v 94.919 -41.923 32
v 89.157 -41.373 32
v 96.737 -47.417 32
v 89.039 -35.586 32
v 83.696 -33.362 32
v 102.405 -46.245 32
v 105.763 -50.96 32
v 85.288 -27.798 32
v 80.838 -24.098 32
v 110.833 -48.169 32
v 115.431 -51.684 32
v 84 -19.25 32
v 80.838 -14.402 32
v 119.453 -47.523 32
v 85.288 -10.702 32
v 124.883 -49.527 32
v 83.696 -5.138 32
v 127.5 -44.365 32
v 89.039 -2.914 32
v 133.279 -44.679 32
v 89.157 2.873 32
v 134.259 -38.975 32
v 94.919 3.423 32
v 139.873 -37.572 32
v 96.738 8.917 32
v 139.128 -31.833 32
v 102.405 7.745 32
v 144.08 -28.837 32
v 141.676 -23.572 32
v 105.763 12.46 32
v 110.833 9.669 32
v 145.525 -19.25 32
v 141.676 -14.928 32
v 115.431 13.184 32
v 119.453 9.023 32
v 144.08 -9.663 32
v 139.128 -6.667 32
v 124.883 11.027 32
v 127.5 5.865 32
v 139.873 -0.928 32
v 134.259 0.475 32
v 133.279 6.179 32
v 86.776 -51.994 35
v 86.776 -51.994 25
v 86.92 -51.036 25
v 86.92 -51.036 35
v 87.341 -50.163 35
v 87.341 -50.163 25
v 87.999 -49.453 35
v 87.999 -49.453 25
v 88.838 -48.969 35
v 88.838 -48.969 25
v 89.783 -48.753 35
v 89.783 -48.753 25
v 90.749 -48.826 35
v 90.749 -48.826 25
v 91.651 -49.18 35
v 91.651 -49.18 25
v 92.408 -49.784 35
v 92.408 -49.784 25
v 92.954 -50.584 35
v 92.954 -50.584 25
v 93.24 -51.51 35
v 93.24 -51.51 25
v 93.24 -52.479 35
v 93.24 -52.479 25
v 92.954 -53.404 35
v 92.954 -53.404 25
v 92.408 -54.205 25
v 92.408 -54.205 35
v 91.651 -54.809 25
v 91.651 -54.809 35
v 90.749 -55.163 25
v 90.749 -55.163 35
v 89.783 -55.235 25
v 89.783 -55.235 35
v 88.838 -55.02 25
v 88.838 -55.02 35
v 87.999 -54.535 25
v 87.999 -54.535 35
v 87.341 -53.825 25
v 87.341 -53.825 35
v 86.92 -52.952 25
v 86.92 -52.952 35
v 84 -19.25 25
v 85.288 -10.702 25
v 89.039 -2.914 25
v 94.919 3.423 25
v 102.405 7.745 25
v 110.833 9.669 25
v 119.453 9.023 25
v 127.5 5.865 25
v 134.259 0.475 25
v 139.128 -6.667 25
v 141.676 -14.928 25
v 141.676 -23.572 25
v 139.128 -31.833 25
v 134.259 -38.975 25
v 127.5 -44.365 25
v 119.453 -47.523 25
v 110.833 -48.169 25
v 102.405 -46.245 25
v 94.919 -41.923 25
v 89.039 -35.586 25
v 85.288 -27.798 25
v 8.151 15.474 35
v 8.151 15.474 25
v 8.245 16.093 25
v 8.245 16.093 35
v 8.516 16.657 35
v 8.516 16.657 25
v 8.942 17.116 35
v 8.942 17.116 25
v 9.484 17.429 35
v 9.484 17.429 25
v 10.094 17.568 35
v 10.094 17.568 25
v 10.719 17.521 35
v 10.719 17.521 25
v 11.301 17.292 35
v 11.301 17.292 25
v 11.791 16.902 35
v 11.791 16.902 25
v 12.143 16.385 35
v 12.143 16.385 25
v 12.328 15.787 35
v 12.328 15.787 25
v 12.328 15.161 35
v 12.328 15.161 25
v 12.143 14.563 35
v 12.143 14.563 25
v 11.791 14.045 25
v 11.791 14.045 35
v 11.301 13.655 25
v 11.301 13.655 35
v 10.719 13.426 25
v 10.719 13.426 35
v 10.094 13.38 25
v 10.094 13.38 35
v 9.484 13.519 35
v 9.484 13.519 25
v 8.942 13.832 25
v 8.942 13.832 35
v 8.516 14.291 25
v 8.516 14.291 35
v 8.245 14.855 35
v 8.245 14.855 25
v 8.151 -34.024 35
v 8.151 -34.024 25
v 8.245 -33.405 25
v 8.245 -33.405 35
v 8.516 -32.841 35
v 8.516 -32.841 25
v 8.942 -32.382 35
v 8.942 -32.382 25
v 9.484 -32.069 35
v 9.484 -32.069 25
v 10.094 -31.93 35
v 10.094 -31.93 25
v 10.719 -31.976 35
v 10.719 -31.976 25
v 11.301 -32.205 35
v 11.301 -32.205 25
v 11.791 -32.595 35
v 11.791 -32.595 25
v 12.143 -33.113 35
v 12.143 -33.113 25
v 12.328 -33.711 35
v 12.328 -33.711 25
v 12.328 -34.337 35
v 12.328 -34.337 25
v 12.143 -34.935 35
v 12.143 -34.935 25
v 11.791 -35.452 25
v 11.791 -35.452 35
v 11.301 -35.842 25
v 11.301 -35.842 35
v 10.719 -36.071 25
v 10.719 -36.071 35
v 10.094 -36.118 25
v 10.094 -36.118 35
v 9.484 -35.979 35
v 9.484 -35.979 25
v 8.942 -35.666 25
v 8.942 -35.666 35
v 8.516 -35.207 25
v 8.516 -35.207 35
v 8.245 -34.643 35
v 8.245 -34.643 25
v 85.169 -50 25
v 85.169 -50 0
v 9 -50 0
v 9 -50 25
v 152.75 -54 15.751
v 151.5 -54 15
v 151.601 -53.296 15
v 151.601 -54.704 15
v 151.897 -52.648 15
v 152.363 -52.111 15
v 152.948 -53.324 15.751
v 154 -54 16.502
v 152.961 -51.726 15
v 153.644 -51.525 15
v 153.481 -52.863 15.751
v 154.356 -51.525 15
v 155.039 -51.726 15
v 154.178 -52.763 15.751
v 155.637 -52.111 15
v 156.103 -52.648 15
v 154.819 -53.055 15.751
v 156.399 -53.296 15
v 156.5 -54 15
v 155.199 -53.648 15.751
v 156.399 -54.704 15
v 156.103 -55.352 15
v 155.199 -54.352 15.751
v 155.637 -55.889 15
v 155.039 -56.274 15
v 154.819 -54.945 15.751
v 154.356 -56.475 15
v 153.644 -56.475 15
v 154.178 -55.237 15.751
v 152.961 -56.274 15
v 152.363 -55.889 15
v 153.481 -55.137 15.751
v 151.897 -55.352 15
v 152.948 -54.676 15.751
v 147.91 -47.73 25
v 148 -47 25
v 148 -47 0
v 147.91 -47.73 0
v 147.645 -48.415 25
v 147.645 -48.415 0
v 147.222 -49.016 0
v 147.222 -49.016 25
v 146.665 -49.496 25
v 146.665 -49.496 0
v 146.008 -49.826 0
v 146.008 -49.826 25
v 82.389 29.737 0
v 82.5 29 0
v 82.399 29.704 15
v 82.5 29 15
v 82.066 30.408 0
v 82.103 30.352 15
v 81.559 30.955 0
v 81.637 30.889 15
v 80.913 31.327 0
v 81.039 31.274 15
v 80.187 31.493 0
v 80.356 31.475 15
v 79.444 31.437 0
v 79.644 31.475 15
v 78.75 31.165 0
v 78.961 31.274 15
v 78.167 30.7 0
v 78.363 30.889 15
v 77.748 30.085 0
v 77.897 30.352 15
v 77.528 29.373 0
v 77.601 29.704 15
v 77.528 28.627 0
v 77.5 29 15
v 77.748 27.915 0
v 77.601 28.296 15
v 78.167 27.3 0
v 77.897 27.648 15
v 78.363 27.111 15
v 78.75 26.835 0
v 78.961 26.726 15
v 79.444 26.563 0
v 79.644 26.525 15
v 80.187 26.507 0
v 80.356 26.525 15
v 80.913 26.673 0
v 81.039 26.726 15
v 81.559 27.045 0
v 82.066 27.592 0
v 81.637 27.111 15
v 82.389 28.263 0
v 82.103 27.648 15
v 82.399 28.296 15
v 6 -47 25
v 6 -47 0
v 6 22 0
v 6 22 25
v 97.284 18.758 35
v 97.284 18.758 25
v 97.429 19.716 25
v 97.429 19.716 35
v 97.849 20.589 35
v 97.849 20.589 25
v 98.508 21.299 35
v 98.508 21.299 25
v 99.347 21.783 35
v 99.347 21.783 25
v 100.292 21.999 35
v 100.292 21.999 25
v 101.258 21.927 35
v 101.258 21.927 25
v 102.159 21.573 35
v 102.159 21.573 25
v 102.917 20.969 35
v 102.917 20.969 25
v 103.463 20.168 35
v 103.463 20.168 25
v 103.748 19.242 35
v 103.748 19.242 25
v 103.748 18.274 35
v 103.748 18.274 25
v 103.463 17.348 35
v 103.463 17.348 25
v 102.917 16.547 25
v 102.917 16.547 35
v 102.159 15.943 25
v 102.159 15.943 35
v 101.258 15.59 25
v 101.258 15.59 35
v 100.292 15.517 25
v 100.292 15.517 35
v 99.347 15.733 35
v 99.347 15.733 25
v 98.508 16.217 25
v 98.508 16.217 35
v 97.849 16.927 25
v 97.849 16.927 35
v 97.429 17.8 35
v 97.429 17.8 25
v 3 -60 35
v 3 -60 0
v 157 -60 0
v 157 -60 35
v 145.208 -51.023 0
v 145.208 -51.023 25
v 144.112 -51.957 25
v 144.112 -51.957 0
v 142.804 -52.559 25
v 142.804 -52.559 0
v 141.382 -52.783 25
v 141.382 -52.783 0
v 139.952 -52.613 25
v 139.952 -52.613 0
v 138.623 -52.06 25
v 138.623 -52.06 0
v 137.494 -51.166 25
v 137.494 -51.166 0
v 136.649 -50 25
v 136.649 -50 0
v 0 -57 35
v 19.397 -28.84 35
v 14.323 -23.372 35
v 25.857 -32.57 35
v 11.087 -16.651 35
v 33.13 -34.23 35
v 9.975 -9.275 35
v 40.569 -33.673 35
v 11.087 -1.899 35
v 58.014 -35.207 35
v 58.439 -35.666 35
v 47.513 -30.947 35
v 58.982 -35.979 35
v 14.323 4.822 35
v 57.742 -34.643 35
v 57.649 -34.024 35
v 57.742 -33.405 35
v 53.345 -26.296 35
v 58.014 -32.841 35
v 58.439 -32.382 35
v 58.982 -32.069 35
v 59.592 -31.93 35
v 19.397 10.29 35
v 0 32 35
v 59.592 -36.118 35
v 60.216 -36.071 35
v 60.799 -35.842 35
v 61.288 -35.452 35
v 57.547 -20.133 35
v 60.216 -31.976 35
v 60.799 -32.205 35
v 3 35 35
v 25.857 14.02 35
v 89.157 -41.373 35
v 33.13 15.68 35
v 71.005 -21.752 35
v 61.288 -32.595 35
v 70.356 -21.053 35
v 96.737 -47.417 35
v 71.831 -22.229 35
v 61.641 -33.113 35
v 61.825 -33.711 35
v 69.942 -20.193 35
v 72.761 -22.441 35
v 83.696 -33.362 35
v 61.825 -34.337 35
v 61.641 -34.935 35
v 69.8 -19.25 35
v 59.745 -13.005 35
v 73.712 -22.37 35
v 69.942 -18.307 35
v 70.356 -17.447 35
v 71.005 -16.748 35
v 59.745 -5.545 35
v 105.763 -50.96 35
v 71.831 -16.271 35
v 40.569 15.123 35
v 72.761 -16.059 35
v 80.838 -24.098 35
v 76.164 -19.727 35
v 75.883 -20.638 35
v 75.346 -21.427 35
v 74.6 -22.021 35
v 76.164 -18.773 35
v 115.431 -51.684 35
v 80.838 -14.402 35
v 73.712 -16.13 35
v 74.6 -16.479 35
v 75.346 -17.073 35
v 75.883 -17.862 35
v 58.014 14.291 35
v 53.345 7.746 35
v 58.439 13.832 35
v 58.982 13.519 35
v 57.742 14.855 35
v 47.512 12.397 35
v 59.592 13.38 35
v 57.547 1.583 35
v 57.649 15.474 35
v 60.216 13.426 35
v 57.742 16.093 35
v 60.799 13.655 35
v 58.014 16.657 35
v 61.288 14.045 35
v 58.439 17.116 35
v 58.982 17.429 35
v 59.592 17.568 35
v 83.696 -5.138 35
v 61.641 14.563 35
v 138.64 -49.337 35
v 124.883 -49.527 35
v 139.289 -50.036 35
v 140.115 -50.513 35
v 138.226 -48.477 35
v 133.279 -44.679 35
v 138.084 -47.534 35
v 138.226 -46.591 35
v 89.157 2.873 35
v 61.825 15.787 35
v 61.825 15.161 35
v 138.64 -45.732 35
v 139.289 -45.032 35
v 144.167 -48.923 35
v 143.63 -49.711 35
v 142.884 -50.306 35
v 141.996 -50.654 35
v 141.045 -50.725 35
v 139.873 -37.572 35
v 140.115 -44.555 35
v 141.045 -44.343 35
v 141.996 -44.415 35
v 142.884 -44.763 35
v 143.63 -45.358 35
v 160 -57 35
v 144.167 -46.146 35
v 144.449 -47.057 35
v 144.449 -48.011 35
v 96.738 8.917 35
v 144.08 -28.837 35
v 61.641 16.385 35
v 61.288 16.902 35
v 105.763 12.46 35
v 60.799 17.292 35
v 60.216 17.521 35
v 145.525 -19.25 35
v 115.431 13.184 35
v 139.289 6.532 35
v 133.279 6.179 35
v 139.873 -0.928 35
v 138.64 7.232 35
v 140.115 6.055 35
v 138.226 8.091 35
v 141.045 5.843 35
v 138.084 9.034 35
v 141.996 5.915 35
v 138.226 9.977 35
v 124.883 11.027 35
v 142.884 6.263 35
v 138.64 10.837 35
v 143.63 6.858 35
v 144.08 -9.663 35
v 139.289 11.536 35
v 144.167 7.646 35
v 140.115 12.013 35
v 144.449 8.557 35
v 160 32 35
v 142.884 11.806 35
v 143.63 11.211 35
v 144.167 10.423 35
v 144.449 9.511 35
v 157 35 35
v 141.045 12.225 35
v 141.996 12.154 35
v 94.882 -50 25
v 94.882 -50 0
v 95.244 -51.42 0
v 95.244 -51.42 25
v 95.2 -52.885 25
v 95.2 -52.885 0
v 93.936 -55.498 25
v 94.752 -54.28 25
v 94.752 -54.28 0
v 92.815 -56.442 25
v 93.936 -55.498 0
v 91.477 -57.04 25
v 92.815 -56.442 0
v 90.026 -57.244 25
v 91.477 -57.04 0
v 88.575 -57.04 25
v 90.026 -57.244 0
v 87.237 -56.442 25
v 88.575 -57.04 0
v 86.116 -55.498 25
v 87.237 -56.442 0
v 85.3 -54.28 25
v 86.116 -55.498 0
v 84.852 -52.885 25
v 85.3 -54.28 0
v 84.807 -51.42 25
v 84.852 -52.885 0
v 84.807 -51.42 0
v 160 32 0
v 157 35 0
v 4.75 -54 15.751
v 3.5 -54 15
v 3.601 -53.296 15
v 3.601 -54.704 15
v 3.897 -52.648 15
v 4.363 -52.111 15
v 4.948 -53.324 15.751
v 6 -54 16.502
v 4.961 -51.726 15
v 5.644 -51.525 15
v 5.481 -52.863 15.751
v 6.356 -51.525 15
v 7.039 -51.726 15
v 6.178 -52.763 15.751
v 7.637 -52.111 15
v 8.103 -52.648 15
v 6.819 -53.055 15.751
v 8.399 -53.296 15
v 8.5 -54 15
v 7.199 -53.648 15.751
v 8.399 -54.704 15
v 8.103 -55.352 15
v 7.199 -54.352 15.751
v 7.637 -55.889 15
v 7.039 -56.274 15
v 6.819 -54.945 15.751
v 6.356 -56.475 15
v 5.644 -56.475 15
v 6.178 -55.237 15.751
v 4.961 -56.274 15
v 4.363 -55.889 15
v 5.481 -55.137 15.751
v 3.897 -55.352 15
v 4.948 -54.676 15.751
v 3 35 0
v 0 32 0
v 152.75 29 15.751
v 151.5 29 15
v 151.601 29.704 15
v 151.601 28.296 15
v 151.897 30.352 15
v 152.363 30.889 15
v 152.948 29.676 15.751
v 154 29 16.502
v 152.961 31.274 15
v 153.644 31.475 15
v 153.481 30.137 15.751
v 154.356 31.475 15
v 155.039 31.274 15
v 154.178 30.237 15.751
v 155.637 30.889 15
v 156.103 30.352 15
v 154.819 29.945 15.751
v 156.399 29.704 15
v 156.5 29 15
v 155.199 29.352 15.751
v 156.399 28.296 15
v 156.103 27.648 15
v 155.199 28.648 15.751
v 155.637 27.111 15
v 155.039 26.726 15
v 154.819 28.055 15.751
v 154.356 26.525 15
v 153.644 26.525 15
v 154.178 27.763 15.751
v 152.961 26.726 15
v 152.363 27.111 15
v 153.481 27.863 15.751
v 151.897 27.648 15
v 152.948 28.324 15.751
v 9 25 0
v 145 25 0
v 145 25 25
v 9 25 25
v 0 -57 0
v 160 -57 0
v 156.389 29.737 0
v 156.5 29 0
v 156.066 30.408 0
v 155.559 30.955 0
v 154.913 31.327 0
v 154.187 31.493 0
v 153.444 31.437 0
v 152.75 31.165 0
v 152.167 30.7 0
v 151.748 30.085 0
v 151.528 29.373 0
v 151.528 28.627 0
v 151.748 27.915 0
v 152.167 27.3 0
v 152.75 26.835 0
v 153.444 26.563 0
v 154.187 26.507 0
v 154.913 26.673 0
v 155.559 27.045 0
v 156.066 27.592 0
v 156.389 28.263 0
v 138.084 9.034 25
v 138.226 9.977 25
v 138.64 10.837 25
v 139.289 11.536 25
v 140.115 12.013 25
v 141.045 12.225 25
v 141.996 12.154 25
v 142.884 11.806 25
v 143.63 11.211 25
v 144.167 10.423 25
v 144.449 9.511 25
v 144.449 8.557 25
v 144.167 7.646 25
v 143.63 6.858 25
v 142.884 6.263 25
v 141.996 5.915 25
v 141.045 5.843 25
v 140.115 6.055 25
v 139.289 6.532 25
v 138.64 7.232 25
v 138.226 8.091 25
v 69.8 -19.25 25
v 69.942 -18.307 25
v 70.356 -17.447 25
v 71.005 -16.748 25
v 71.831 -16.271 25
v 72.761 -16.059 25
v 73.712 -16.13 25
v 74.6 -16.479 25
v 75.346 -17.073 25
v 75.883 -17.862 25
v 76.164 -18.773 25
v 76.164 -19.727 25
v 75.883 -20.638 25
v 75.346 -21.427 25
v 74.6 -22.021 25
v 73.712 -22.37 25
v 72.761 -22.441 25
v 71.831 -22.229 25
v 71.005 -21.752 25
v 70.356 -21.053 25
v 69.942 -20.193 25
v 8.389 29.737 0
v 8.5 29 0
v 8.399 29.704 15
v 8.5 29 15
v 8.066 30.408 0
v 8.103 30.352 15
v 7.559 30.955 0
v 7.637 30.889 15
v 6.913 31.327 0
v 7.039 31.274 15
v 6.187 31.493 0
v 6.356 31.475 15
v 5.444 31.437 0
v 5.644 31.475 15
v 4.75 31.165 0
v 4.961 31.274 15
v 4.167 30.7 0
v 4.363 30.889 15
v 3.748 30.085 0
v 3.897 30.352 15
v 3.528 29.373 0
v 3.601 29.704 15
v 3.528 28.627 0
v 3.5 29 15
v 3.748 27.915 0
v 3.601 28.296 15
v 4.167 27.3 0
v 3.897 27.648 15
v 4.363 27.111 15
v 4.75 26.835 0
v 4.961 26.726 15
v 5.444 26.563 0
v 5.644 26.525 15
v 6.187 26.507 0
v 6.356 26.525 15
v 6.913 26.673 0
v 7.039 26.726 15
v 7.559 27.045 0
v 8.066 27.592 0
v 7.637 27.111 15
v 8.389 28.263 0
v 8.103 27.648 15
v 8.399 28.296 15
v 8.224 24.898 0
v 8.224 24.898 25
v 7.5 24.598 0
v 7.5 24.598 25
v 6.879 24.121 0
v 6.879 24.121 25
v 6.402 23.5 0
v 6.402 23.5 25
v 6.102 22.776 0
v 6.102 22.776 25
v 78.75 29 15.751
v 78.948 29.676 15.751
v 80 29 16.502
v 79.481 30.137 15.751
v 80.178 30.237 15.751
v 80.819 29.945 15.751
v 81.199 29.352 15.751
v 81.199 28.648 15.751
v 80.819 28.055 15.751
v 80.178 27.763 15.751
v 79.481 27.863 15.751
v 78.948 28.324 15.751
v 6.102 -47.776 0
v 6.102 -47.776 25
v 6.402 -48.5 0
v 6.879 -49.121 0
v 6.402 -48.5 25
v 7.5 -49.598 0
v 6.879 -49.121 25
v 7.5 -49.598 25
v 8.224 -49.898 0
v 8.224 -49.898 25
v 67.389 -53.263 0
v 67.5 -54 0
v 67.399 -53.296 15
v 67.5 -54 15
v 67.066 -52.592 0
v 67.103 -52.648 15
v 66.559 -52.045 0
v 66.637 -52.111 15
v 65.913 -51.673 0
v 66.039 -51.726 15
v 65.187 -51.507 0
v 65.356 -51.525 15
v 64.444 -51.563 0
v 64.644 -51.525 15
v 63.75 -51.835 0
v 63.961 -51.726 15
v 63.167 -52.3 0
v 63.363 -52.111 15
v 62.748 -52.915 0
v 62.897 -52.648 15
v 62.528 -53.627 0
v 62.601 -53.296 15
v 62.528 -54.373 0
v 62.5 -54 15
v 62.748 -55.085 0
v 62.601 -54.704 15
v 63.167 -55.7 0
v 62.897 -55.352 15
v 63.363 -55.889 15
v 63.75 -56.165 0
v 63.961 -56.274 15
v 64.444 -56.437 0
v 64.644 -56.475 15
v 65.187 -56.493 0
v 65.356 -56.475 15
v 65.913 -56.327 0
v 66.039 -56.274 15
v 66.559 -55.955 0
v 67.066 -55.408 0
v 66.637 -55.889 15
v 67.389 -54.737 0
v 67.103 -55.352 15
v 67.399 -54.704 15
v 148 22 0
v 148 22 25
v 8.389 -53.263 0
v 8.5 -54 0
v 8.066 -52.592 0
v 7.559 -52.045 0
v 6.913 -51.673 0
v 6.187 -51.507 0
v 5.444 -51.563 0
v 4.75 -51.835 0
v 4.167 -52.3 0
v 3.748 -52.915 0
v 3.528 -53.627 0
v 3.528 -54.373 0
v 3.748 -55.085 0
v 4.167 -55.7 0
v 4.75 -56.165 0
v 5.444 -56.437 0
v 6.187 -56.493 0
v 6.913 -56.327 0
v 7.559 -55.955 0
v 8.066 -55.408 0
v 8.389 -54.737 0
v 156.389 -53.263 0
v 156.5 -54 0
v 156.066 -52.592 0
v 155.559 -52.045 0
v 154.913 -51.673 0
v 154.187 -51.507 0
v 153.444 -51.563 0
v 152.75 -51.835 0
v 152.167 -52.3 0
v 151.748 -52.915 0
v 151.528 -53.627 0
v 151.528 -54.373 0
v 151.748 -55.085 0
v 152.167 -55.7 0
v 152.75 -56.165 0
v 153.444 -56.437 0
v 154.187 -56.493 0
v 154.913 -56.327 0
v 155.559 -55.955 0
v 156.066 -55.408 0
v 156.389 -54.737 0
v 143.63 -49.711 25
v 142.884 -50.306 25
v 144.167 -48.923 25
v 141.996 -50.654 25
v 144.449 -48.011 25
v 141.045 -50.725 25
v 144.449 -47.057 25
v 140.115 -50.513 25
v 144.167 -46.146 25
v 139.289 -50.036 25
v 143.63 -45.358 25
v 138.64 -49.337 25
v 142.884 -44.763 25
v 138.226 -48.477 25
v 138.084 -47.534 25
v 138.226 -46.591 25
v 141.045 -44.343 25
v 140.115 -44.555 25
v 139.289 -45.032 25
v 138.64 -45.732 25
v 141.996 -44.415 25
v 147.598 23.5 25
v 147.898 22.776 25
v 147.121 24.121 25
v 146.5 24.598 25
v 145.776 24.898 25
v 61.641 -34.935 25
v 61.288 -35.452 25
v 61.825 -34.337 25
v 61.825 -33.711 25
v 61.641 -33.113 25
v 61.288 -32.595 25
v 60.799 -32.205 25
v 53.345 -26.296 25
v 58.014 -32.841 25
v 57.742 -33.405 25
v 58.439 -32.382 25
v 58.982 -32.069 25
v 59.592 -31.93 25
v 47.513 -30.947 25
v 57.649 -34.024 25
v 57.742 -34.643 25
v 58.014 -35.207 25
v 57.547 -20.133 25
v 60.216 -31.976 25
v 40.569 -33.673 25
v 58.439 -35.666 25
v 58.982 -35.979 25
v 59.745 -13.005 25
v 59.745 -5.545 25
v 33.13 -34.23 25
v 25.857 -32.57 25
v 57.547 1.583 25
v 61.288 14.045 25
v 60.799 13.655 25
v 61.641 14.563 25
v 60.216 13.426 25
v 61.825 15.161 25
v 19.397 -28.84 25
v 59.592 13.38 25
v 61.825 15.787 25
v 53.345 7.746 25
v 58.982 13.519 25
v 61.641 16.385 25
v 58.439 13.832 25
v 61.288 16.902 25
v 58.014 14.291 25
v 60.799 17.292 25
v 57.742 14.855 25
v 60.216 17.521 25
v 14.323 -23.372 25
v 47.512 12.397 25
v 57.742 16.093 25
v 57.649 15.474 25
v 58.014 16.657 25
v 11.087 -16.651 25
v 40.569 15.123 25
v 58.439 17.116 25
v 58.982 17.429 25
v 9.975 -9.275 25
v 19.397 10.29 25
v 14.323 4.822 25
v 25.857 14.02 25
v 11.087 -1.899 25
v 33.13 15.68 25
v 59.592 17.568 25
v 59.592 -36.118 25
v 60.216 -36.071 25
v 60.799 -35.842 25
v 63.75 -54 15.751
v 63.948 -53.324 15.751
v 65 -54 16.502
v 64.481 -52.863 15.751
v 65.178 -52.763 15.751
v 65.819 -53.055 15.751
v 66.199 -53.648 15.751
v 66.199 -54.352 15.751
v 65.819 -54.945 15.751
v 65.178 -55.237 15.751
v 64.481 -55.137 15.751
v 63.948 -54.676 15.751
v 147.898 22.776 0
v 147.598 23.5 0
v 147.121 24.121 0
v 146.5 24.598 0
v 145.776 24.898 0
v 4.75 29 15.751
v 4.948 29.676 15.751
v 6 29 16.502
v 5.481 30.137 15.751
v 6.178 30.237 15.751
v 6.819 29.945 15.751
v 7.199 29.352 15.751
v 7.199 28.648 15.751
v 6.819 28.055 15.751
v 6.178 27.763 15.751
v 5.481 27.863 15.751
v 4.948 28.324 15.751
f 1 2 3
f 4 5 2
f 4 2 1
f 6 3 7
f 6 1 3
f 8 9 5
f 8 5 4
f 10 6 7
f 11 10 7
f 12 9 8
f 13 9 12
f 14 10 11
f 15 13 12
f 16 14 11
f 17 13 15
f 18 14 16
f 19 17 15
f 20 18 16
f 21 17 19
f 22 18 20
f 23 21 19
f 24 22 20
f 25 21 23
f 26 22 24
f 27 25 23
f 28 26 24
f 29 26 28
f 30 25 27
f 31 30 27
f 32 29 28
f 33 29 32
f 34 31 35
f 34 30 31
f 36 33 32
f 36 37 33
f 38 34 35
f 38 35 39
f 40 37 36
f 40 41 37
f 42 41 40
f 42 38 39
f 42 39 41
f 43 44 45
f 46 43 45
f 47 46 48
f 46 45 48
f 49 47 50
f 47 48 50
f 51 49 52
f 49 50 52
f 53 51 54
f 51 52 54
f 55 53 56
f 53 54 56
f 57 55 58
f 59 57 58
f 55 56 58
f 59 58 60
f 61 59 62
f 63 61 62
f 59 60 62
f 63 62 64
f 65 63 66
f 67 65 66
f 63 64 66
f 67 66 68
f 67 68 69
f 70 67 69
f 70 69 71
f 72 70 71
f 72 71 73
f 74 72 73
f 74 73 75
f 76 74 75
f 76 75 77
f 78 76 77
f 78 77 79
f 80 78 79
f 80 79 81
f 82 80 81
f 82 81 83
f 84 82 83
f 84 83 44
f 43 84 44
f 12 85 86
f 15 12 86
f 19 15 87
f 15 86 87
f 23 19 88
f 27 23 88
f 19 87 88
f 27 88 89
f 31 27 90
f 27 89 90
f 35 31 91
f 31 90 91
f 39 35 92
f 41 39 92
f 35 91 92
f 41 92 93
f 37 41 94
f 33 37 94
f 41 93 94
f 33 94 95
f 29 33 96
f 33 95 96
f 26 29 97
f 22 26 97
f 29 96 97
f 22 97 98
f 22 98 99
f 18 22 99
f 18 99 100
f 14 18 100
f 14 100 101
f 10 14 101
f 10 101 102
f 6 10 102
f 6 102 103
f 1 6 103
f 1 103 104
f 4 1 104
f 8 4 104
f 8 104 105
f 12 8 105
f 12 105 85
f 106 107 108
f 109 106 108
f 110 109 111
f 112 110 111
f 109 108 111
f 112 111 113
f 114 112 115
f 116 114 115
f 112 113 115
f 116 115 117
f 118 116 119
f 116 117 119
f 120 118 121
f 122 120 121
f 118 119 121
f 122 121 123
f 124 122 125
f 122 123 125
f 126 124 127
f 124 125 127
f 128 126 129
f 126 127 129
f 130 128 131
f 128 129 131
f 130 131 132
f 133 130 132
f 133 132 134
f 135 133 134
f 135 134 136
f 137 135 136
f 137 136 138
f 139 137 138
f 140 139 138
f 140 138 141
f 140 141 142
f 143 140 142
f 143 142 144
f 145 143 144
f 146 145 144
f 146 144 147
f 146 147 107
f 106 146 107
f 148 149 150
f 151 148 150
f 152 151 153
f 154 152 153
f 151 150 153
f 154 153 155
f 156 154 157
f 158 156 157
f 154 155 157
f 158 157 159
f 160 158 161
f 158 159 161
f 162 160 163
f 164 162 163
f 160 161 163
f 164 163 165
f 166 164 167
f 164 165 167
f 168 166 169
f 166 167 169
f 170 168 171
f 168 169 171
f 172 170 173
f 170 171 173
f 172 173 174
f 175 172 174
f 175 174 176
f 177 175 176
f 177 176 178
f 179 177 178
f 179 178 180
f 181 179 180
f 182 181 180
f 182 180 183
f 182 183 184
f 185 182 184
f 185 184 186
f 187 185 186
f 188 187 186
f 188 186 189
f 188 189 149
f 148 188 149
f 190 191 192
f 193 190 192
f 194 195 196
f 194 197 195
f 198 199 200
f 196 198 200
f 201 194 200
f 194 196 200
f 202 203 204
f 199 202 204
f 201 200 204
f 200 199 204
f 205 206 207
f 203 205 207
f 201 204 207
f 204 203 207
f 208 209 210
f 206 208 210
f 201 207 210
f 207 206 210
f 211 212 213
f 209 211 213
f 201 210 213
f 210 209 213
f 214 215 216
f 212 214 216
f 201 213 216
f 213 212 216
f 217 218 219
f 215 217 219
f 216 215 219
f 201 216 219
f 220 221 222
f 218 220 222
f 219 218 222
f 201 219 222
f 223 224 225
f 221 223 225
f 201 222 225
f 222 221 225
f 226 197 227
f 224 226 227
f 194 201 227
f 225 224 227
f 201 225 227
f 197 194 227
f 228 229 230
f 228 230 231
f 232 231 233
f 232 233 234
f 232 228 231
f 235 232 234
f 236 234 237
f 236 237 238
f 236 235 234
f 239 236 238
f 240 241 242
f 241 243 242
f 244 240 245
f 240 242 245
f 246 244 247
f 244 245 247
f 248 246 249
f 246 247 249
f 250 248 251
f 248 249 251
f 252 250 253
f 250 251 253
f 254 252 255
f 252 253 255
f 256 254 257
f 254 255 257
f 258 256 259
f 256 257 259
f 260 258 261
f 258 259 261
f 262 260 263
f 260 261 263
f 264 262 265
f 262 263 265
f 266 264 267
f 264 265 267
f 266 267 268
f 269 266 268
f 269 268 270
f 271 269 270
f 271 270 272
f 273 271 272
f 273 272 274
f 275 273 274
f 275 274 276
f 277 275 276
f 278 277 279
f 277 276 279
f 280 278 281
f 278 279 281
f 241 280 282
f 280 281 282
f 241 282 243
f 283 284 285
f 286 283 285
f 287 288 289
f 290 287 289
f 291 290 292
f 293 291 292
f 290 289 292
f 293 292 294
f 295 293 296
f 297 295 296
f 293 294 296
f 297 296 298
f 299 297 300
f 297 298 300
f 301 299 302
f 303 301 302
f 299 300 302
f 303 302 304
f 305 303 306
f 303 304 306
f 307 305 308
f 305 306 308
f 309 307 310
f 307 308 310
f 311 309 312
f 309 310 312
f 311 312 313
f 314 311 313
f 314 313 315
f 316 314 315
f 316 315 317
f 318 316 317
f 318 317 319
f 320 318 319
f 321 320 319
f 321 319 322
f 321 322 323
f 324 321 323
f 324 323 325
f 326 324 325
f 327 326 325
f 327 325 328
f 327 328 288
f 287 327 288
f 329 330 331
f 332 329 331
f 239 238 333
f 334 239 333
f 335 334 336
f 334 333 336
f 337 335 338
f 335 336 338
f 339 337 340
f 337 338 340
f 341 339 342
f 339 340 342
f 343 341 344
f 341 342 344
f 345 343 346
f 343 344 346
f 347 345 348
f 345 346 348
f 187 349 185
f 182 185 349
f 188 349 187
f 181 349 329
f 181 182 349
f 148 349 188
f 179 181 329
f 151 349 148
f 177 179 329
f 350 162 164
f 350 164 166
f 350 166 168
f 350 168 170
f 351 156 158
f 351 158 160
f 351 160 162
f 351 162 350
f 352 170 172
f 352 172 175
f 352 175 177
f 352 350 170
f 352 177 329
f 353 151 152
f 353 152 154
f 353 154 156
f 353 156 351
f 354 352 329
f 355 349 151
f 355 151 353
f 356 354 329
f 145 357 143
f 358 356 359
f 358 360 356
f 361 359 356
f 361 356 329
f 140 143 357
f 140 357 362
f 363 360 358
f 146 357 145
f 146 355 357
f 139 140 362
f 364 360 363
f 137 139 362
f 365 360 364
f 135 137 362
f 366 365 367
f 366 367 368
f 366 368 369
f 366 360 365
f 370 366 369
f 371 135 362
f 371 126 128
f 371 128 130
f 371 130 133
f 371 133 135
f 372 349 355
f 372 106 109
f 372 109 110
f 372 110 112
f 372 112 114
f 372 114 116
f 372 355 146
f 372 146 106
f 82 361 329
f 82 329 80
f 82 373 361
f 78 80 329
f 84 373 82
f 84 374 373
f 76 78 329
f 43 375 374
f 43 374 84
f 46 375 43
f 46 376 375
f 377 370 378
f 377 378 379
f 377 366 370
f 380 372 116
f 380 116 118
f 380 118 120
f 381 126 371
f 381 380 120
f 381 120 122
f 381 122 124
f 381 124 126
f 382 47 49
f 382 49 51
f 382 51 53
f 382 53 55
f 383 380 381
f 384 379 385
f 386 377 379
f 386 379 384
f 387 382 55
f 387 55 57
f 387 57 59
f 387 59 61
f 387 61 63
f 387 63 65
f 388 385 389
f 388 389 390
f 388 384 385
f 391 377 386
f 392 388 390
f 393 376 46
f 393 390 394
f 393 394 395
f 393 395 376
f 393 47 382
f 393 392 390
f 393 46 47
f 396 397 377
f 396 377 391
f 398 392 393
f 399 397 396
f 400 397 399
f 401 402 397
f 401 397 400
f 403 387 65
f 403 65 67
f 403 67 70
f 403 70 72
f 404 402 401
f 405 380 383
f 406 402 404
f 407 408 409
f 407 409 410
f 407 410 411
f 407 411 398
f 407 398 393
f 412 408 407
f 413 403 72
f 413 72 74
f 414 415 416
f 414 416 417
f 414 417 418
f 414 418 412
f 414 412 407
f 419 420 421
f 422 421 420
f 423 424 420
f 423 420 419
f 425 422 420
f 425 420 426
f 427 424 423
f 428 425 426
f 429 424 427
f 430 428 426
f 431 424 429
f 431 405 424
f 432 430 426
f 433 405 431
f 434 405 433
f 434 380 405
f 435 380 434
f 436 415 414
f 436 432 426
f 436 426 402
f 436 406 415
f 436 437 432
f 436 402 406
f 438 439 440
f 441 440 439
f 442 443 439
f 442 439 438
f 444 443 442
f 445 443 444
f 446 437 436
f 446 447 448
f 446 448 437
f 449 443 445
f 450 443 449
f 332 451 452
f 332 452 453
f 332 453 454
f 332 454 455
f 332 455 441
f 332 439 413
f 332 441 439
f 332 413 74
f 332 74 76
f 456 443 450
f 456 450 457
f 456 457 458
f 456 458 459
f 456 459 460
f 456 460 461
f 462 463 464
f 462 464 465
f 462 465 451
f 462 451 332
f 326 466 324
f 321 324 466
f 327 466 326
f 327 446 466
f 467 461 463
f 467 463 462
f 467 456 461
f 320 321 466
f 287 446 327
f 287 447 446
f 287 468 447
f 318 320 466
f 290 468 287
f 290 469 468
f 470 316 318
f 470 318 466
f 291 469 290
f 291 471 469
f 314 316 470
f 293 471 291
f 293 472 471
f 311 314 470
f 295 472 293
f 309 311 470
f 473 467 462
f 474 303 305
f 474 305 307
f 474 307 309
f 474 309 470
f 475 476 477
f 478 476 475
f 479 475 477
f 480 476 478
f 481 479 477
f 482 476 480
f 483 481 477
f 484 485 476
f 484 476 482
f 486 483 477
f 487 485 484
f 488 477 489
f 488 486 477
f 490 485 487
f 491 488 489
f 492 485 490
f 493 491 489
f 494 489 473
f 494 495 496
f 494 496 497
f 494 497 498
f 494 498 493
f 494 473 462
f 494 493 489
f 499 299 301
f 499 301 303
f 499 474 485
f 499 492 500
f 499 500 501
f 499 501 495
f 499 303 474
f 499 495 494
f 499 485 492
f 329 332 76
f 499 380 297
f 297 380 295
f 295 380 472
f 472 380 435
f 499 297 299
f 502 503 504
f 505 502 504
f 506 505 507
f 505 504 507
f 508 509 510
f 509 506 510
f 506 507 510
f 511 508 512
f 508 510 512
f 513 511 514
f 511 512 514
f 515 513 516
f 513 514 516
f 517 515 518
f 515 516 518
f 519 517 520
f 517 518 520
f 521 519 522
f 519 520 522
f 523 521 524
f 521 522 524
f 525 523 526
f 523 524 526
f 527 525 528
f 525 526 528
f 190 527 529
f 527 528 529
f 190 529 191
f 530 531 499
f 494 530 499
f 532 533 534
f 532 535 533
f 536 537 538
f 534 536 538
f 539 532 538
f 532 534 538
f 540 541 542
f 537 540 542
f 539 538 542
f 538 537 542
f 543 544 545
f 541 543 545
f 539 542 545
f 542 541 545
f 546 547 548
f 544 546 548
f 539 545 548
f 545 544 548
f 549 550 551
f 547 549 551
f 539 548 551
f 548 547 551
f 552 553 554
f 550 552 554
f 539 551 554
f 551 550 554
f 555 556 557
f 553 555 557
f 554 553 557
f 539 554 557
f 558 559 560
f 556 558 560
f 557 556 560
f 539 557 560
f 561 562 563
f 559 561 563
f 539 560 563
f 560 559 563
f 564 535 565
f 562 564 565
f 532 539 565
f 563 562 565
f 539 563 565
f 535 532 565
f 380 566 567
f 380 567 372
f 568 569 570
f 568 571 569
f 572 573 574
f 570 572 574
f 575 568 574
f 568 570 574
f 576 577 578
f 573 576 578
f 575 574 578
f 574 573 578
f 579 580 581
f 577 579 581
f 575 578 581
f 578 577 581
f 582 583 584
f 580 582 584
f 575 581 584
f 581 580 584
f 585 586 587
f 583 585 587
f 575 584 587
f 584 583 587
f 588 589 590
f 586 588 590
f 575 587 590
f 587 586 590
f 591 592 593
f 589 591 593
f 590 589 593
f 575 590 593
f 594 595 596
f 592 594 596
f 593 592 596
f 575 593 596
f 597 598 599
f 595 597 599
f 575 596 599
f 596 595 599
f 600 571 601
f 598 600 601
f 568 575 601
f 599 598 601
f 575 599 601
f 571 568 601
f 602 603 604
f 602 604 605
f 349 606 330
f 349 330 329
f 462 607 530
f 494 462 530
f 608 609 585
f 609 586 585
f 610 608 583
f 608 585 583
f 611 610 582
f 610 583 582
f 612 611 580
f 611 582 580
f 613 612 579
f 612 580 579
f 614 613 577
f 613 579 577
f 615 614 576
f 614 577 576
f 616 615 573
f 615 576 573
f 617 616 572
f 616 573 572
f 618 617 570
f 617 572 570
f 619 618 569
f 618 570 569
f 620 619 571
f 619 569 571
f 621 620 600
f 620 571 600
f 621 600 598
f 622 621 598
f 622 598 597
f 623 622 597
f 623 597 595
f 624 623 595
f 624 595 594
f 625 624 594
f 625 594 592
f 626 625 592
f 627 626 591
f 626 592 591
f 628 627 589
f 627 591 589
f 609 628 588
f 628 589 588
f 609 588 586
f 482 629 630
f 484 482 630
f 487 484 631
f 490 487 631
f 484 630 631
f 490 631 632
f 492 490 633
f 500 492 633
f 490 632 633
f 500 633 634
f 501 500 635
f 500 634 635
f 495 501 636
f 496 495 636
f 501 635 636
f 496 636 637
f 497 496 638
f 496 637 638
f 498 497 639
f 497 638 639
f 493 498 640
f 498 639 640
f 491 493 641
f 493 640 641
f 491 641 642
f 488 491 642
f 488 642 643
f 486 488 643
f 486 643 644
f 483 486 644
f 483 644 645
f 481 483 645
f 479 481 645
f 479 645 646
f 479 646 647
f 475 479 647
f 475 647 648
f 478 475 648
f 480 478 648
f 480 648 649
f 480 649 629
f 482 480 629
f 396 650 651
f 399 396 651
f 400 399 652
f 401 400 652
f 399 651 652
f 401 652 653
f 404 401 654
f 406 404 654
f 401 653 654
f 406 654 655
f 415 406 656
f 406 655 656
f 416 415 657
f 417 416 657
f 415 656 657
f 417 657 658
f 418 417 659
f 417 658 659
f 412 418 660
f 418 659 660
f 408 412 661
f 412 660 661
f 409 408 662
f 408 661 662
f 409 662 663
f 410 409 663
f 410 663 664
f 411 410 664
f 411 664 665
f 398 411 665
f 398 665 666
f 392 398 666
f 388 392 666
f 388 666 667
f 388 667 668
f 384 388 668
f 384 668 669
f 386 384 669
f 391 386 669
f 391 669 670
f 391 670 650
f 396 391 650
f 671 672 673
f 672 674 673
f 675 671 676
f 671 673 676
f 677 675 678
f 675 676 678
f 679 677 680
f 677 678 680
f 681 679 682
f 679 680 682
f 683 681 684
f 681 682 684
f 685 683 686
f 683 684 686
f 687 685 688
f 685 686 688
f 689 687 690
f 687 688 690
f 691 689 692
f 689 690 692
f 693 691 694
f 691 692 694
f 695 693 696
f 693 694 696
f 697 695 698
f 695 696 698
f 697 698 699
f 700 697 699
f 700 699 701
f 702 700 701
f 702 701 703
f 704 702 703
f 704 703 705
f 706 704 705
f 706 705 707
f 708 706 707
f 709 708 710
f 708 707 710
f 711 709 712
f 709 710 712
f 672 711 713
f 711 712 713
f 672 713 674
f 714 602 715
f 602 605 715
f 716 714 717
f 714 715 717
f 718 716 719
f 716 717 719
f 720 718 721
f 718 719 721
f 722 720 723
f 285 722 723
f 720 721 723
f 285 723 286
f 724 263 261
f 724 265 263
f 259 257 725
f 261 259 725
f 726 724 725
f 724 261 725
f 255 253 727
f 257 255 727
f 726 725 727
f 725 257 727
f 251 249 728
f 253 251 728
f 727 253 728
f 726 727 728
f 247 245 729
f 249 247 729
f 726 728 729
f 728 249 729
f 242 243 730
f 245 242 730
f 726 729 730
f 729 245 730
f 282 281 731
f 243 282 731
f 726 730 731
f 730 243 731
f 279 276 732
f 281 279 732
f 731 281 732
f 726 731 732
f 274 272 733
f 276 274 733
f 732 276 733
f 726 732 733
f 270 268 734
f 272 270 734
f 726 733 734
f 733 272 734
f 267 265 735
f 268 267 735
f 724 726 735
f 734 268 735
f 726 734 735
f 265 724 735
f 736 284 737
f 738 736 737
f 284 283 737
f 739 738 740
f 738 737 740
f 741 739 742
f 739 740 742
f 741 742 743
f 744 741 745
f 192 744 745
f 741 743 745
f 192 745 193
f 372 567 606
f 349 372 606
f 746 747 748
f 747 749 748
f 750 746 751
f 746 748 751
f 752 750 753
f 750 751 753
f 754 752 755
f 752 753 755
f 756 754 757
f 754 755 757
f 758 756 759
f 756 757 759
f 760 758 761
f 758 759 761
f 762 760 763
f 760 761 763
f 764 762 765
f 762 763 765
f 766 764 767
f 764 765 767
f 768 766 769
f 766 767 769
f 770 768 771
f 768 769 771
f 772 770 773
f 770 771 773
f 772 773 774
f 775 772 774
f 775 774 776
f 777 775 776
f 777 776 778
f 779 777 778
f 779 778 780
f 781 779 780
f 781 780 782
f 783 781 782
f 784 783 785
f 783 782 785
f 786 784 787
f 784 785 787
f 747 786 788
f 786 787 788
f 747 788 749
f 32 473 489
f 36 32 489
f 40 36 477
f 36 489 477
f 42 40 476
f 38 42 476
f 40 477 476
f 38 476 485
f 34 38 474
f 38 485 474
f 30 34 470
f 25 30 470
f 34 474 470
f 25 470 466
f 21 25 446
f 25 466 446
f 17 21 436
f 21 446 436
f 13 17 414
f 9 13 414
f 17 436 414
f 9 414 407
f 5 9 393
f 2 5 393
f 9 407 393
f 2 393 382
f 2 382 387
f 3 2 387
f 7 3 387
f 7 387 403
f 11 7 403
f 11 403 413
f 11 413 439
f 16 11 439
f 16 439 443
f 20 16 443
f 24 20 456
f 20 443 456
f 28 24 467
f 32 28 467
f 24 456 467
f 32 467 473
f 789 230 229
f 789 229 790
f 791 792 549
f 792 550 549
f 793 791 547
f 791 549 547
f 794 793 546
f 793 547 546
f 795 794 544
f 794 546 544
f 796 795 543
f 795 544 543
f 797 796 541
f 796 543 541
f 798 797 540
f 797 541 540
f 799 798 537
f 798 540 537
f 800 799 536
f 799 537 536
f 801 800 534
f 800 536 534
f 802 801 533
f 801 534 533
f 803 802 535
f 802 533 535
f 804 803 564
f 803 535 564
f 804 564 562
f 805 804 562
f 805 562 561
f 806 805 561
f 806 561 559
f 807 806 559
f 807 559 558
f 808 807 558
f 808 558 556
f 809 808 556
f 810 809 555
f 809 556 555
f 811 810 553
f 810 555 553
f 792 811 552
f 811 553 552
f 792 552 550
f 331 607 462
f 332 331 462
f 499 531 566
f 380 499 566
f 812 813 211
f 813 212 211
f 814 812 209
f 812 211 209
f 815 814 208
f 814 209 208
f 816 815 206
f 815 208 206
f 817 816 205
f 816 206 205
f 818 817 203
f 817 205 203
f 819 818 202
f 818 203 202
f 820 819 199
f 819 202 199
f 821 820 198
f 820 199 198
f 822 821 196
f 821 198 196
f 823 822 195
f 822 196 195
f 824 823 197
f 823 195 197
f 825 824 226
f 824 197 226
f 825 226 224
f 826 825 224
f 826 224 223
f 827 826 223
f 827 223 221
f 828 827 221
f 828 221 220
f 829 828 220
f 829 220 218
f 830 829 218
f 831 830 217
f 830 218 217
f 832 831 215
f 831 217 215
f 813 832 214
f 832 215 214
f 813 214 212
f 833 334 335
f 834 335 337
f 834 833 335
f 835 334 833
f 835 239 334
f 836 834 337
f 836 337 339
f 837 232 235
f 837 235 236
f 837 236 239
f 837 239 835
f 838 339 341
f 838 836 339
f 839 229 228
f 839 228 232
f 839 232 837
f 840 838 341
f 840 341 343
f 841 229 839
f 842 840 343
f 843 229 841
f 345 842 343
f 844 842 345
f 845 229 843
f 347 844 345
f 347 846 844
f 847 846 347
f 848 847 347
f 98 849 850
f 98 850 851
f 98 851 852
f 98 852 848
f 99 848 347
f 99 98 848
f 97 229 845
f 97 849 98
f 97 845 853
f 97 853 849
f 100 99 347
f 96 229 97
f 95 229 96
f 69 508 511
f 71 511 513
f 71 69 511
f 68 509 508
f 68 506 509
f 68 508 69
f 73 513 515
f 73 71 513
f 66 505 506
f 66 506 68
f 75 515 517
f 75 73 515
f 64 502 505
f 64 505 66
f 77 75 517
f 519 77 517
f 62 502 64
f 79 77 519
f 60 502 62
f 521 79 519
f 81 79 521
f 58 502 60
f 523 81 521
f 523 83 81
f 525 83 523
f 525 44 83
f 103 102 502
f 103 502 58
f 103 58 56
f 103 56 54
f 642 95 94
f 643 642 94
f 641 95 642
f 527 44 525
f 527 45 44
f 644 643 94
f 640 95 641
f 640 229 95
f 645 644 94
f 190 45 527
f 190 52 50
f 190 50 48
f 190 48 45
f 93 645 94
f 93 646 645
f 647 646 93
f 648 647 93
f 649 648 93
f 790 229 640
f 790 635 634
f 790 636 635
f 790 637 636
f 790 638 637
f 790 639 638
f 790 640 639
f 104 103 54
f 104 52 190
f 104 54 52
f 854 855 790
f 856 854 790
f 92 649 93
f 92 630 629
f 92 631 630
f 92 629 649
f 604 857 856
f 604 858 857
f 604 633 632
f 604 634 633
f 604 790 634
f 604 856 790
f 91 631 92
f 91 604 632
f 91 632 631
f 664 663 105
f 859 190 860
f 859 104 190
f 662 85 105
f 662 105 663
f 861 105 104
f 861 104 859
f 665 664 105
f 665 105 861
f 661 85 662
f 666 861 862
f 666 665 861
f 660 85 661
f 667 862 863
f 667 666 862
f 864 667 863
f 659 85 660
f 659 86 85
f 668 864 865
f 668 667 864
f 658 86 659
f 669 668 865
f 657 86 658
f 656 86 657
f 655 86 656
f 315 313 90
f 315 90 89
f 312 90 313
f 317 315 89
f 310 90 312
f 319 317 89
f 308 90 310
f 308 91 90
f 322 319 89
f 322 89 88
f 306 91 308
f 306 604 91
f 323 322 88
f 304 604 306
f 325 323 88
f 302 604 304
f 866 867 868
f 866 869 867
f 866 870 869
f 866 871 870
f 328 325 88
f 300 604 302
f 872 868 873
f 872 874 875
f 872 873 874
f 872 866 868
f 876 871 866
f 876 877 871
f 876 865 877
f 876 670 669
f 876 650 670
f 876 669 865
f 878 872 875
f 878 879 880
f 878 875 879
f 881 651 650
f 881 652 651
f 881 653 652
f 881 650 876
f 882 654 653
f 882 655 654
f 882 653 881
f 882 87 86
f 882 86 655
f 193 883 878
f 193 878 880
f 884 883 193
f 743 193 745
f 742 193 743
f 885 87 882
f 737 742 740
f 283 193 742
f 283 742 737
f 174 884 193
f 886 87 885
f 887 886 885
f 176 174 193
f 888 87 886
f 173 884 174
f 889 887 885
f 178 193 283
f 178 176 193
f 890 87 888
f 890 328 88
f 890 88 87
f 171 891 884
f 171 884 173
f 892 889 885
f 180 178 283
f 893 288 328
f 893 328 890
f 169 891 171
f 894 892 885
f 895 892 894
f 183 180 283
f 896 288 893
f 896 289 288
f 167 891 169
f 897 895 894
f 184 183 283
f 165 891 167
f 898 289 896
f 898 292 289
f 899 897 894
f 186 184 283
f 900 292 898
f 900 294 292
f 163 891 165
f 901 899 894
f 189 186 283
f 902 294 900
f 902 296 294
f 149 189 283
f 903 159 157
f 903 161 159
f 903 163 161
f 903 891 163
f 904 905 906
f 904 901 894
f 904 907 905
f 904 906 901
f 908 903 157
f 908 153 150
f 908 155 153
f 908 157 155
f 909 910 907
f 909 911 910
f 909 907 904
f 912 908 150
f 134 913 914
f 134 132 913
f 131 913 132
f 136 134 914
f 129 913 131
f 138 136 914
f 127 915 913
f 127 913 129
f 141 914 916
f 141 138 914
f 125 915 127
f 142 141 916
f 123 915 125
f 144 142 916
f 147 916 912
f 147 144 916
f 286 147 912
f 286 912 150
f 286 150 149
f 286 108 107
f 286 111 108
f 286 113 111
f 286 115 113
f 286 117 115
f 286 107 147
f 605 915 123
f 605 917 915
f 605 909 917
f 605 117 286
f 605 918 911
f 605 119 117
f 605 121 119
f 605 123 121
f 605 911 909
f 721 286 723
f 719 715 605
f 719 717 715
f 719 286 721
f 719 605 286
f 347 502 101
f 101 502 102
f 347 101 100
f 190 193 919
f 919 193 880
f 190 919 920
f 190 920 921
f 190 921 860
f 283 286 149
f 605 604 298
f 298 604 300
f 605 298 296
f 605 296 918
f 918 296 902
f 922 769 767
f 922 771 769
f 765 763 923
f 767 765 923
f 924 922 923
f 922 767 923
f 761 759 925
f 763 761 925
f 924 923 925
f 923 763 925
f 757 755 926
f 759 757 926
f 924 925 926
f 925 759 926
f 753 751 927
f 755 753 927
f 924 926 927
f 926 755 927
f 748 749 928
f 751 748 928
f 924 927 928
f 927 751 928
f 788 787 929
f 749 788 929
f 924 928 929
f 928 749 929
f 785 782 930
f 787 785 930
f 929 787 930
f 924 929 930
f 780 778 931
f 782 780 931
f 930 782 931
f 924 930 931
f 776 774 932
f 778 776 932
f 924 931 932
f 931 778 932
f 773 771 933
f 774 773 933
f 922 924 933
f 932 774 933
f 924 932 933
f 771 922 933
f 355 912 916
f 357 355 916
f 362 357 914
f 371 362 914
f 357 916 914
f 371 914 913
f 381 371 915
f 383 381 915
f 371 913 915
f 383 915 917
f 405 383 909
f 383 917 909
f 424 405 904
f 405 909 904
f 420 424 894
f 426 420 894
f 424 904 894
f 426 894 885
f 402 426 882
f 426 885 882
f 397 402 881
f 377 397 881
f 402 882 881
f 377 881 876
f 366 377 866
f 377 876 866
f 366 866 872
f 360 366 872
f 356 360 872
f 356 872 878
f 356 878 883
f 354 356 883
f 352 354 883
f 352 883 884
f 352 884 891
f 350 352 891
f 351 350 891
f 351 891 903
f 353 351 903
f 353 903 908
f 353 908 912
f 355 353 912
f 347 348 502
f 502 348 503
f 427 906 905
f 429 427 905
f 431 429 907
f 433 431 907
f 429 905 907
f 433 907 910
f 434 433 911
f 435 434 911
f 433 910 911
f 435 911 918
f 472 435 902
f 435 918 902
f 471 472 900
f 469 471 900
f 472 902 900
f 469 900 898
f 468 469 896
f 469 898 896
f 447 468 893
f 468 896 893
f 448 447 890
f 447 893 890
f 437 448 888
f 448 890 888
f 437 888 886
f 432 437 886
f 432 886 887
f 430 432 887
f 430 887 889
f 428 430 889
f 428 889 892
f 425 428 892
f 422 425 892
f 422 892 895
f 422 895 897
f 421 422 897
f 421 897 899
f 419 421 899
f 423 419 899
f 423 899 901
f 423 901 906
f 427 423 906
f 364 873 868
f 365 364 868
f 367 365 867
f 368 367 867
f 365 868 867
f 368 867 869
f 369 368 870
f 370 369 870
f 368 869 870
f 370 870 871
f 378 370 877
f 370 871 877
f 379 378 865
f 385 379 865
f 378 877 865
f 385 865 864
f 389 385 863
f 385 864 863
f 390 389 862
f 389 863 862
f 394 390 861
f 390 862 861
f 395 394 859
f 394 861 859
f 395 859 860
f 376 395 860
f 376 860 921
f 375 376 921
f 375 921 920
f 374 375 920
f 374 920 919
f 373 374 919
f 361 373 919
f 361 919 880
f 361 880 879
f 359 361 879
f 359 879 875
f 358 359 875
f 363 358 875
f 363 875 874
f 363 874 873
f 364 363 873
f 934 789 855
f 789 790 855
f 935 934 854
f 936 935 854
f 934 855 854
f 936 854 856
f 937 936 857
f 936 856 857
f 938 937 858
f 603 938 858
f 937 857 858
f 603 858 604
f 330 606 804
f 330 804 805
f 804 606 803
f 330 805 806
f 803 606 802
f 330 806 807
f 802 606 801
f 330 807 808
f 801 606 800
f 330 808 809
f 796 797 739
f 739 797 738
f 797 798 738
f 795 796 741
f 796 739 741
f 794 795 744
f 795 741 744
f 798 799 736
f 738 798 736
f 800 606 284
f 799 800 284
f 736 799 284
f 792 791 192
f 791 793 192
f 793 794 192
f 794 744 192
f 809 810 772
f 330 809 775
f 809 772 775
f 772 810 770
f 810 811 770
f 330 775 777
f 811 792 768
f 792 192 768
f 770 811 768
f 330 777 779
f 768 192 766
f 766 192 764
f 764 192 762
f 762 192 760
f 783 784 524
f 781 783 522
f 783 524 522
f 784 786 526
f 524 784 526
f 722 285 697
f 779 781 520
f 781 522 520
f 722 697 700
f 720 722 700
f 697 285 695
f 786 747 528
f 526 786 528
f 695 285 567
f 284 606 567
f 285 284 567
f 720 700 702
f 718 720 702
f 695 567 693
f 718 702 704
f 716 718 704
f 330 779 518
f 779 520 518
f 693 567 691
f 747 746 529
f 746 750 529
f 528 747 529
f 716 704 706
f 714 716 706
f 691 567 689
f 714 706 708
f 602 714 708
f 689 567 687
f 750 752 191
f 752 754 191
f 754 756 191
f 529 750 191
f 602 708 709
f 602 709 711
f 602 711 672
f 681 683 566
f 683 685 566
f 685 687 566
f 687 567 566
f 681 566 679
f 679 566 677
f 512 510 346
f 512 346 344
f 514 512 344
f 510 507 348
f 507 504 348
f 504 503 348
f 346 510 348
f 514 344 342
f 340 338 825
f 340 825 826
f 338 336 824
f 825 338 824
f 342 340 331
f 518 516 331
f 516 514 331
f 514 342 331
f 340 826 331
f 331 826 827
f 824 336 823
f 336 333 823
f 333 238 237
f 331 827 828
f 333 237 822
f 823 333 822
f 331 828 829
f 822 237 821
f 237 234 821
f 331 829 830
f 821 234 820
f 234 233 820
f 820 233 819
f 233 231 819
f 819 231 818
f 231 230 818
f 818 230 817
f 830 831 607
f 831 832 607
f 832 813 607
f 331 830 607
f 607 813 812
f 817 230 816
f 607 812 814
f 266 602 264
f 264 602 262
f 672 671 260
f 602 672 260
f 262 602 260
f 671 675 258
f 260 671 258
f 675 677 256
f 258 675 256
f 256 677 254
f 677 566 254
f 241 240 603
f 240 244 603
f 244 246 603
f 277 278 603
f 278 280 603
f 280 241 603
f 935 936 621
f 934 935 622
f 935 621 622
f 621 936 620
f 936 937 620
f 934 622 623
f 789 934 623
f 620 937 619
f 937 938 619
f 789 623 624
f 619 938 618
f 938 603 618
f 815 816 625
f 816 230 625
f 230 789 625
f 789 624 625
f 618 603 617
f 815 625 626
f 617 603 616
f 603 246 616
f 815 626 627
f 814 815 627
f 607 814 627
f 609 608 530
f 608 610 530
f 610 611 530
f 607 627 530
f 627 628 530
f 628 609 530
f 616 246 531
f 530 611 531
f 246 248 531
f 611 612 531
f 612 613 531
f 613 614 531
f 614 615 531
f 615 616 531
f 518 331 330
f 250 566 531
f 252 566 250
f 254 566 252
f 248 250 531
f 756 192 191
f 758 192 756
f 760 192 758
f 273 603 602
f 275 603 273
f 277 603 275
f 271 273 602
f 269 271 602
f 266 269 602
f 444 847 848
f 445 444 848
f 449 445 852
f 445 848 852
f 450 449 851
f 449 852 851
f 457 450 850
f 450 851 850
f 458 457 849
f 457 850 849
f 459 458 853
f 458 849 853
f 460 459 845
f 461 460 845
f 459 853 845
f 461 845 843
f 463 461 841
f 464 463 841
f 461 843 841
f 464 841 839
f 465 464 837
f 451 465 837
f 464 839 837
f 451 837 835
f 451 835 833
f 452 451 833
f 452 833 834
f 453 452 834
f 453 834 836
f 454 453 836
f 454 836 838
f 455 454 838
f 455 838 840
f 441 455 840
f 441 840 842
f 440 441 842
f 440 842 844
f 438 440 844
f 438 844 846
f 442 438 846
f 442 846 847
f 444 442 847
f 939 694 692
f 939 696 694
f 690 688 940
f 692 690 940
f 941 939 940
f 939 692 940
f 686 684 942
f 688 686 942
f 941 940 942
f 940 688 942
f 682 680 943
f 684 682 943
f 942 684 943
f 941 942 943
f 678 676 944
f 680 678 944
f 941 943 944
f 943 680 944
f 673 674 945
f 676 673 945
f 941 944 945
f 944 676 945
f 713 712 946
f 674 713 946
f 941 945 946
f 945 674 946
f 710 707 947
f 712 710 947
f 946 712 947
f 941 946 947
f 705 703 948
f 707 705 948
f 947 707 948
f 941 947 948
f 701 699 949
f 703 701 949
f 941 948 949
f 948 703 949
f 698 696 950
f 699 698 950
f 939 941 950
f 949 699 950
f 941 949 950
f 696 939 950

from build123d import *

# Parameters (mm, degrees)
EXTRUDE_1_DEPTH        = 35
SKETCH_4_W             = 142
SKETCH_4_H             = 75
CUT_EXTRUDE_2_DEPTH    = 25
SKETCH_5_R             = 29
CUT_EXTRUDE_3_DEPTH    = 11
CHAMFER_3_SIZE         = 3
FILLET_2_R             = 3
SKETCH_7_R             = 3.2
SKETCH_7_R_2           = 3.25
CUT_EXTRUDE_4_DEPTH    = 11
SKETCH_8_R             = 25.025
CUT_EXTRUDE_5_DEPTH    = 11
SKETCH_9_R             = 5.25
CUT_EXTRUDE_6_DEPTH    = 25
HOLE_WIZARD_M6_1_D     = 5
HOLE_WIZARD_M6_1_DEPTH = 15
HOLE_WIZARD_M6_1_TIP   = 1.502151548
HOLE_WIZARD_M5_1_D     = 4.2
SKETCH_17_R            = 32.525
CUT_EXTRUDE_7_DEPTH    = 3


with BuildPart() as part:
    # 草图1 → 凸台-拉伸1 (new body)
    with BuildSketch(Plane.XY):
        Polygon((0, 0), (0, -60), (160, -60), (160, 35), (68, 35), (0, 35), align=None)
    extrude(amount=EXTRUDE_1_DEPTH)

    # 草图4 → 切除-拉伸2 (cut)
    with BuildSketch(Plane(origin=(0, 0, 0), x_dir=(-1, 0, 0), z_dir=(0, 0, -1))):
        with Locations((-77, -12.5)):
            Rectangle(SKETCH_4_W, SKETCH_4_H)
    extrude(amount=-CUT_EXTRUDE_2_DEPTH, mode=Mode.SUBTRACT)

    # 草图5 → 切除-拉伸3 (cut, through all)
    with BuildSketch(Plane(origin=(0, 0, 25), x_dir=(-1, 0, 0), z_dir=(0, 0, -1))):
        with Locations((-113, -19.25)):
            Circle(SKETCH_5_R)
    extrude(amount=-CUT_EXTRUDE_3_DEPTH, mode=Mode.SUBTRACT)

    # 倒角3
    chamfer_3_edges = [part.edges().sort_by_distance(p)[0] for p in [
        (0, 35, 17.5),
        (160, 35, 17.5),
        (160, -60, 17.5),
        (0, -60, 17.5),
    ]]
    chamfer(chamfer_3_edges, length=CHAMFER_3_SIZE)

    # 圆角2
    fillet_2_edges = [part.edges().sort_by_distance(p)[0] for p in [
        (6, 25, 12.5),
        (6, -50, 12.5),
        (148, -50, 12.5),
        (148, 25, 12.5),
    ]]
    fillet(fillet_2_edges, radius=FILLET_2_R)

    # 草图7 → 切除-拉伸4 (cut, through all)
    with BuildSketch(Plane(origin=(0, 0, 25), x_dir=(-1, 0, 0), z_dir=(0, 0, -1))):
        with Locations((-73, -19.25)):
            Circle(SKETCH_7_R)
        with Locations((-141.284271247, -47.534271247)):
            Circle(SKETCH_7_R)
        with Locations((-141.284271247, 9.034271247)):
            Circle(SKETCH_7_R)
        with Locations((-100.534490363, 18.758039538)):
            Circle(SKETCH_7_R_2)
        with Locations((-90.025808003, -51.994259071)):
            Circle(SKETCH_7_R_2)
    extrude(amount=-CUT_EXTRUDE_4_DEPTH, mode=Mode.SUBTRACT)

    # 草图8 → 切除-拉伸5 (cut, through all)
    with BuildSketch(Plane(origin=(0, 0, 25), x_dir=(-1, 0, 0), z_dir=(0, 0, -1))):
        with Locations((-35, -9.275)):
            Circle(SKETCH_8_R)
    extrude(amount=-CUT_EXTRUDE_5_DEPTH, mode=Mode.SUBTRACT)

    # 草图9 → 切除-拉伸6 (cut)
    with BuildSketch(Plane(origin=(0, 0, 0), x_dir=(-1, 0, 0), z_dir=(0, 0, -1))):
        with Locations((-141.284271247, -47.534271247)):
            Circle(SKETCH_9_R)
        with Locations((-90.025808003, -51.994259071)):
            Circle(SKETCH_9_R)
    extrude(amount=-CUT_EXTRUDE_6_DEPTH, mode=Mode.SUBTRACT)

    # M6 螺纹孔1
    with Locations(Plane(origin=(0, 0, 0), x_dir=(-1, 0, 0), z_dir=(0, 0, -1))):
        with Locations((-154, 29), (-80, 29), (-6, 29), (-154, -54), (-6, -54), (-65, -54)):
            Hole(HOLE_WIZARD_M6_1_D / 2, depth=HOLE_WIZARD_M6_1_DEPTH)
            with Locations((0, 0, -(HOLE_WIZARD_M6_1_DEPTH + HOLE_WIZARD_M6_1_TIP / 2))):  # 118° drill point
                Cone(0, HOLE_WIZARD_M6_1_D / 2, HOLE_WIZARD_M6_1_TIP, mode=Mode.SUBTRACT)

    # M5 螺纹孔1 (through all)
    with Locations(Plane.XY.offset(35)):
        with Locations((10.251262658, 15.473737342), (59.748737342, 15.473737342), (59.748737342, -34.023737342), (10.251262658, -34.023737342)):
            Hole(HOLE_WIZARD_M5_1_D / 2)

    # 草图17 → 切除-拉伸7 (cut)
    with BuildSketch(Plane.XY.offset(35)):
        with Locations((113, -19.25)):
            Circle(SKETCH_17_R)
    extrude(amount=-CUT_EXTRUDE_7_DEPTH, mode=Mode.SUBTRACT)


solid = part.part
